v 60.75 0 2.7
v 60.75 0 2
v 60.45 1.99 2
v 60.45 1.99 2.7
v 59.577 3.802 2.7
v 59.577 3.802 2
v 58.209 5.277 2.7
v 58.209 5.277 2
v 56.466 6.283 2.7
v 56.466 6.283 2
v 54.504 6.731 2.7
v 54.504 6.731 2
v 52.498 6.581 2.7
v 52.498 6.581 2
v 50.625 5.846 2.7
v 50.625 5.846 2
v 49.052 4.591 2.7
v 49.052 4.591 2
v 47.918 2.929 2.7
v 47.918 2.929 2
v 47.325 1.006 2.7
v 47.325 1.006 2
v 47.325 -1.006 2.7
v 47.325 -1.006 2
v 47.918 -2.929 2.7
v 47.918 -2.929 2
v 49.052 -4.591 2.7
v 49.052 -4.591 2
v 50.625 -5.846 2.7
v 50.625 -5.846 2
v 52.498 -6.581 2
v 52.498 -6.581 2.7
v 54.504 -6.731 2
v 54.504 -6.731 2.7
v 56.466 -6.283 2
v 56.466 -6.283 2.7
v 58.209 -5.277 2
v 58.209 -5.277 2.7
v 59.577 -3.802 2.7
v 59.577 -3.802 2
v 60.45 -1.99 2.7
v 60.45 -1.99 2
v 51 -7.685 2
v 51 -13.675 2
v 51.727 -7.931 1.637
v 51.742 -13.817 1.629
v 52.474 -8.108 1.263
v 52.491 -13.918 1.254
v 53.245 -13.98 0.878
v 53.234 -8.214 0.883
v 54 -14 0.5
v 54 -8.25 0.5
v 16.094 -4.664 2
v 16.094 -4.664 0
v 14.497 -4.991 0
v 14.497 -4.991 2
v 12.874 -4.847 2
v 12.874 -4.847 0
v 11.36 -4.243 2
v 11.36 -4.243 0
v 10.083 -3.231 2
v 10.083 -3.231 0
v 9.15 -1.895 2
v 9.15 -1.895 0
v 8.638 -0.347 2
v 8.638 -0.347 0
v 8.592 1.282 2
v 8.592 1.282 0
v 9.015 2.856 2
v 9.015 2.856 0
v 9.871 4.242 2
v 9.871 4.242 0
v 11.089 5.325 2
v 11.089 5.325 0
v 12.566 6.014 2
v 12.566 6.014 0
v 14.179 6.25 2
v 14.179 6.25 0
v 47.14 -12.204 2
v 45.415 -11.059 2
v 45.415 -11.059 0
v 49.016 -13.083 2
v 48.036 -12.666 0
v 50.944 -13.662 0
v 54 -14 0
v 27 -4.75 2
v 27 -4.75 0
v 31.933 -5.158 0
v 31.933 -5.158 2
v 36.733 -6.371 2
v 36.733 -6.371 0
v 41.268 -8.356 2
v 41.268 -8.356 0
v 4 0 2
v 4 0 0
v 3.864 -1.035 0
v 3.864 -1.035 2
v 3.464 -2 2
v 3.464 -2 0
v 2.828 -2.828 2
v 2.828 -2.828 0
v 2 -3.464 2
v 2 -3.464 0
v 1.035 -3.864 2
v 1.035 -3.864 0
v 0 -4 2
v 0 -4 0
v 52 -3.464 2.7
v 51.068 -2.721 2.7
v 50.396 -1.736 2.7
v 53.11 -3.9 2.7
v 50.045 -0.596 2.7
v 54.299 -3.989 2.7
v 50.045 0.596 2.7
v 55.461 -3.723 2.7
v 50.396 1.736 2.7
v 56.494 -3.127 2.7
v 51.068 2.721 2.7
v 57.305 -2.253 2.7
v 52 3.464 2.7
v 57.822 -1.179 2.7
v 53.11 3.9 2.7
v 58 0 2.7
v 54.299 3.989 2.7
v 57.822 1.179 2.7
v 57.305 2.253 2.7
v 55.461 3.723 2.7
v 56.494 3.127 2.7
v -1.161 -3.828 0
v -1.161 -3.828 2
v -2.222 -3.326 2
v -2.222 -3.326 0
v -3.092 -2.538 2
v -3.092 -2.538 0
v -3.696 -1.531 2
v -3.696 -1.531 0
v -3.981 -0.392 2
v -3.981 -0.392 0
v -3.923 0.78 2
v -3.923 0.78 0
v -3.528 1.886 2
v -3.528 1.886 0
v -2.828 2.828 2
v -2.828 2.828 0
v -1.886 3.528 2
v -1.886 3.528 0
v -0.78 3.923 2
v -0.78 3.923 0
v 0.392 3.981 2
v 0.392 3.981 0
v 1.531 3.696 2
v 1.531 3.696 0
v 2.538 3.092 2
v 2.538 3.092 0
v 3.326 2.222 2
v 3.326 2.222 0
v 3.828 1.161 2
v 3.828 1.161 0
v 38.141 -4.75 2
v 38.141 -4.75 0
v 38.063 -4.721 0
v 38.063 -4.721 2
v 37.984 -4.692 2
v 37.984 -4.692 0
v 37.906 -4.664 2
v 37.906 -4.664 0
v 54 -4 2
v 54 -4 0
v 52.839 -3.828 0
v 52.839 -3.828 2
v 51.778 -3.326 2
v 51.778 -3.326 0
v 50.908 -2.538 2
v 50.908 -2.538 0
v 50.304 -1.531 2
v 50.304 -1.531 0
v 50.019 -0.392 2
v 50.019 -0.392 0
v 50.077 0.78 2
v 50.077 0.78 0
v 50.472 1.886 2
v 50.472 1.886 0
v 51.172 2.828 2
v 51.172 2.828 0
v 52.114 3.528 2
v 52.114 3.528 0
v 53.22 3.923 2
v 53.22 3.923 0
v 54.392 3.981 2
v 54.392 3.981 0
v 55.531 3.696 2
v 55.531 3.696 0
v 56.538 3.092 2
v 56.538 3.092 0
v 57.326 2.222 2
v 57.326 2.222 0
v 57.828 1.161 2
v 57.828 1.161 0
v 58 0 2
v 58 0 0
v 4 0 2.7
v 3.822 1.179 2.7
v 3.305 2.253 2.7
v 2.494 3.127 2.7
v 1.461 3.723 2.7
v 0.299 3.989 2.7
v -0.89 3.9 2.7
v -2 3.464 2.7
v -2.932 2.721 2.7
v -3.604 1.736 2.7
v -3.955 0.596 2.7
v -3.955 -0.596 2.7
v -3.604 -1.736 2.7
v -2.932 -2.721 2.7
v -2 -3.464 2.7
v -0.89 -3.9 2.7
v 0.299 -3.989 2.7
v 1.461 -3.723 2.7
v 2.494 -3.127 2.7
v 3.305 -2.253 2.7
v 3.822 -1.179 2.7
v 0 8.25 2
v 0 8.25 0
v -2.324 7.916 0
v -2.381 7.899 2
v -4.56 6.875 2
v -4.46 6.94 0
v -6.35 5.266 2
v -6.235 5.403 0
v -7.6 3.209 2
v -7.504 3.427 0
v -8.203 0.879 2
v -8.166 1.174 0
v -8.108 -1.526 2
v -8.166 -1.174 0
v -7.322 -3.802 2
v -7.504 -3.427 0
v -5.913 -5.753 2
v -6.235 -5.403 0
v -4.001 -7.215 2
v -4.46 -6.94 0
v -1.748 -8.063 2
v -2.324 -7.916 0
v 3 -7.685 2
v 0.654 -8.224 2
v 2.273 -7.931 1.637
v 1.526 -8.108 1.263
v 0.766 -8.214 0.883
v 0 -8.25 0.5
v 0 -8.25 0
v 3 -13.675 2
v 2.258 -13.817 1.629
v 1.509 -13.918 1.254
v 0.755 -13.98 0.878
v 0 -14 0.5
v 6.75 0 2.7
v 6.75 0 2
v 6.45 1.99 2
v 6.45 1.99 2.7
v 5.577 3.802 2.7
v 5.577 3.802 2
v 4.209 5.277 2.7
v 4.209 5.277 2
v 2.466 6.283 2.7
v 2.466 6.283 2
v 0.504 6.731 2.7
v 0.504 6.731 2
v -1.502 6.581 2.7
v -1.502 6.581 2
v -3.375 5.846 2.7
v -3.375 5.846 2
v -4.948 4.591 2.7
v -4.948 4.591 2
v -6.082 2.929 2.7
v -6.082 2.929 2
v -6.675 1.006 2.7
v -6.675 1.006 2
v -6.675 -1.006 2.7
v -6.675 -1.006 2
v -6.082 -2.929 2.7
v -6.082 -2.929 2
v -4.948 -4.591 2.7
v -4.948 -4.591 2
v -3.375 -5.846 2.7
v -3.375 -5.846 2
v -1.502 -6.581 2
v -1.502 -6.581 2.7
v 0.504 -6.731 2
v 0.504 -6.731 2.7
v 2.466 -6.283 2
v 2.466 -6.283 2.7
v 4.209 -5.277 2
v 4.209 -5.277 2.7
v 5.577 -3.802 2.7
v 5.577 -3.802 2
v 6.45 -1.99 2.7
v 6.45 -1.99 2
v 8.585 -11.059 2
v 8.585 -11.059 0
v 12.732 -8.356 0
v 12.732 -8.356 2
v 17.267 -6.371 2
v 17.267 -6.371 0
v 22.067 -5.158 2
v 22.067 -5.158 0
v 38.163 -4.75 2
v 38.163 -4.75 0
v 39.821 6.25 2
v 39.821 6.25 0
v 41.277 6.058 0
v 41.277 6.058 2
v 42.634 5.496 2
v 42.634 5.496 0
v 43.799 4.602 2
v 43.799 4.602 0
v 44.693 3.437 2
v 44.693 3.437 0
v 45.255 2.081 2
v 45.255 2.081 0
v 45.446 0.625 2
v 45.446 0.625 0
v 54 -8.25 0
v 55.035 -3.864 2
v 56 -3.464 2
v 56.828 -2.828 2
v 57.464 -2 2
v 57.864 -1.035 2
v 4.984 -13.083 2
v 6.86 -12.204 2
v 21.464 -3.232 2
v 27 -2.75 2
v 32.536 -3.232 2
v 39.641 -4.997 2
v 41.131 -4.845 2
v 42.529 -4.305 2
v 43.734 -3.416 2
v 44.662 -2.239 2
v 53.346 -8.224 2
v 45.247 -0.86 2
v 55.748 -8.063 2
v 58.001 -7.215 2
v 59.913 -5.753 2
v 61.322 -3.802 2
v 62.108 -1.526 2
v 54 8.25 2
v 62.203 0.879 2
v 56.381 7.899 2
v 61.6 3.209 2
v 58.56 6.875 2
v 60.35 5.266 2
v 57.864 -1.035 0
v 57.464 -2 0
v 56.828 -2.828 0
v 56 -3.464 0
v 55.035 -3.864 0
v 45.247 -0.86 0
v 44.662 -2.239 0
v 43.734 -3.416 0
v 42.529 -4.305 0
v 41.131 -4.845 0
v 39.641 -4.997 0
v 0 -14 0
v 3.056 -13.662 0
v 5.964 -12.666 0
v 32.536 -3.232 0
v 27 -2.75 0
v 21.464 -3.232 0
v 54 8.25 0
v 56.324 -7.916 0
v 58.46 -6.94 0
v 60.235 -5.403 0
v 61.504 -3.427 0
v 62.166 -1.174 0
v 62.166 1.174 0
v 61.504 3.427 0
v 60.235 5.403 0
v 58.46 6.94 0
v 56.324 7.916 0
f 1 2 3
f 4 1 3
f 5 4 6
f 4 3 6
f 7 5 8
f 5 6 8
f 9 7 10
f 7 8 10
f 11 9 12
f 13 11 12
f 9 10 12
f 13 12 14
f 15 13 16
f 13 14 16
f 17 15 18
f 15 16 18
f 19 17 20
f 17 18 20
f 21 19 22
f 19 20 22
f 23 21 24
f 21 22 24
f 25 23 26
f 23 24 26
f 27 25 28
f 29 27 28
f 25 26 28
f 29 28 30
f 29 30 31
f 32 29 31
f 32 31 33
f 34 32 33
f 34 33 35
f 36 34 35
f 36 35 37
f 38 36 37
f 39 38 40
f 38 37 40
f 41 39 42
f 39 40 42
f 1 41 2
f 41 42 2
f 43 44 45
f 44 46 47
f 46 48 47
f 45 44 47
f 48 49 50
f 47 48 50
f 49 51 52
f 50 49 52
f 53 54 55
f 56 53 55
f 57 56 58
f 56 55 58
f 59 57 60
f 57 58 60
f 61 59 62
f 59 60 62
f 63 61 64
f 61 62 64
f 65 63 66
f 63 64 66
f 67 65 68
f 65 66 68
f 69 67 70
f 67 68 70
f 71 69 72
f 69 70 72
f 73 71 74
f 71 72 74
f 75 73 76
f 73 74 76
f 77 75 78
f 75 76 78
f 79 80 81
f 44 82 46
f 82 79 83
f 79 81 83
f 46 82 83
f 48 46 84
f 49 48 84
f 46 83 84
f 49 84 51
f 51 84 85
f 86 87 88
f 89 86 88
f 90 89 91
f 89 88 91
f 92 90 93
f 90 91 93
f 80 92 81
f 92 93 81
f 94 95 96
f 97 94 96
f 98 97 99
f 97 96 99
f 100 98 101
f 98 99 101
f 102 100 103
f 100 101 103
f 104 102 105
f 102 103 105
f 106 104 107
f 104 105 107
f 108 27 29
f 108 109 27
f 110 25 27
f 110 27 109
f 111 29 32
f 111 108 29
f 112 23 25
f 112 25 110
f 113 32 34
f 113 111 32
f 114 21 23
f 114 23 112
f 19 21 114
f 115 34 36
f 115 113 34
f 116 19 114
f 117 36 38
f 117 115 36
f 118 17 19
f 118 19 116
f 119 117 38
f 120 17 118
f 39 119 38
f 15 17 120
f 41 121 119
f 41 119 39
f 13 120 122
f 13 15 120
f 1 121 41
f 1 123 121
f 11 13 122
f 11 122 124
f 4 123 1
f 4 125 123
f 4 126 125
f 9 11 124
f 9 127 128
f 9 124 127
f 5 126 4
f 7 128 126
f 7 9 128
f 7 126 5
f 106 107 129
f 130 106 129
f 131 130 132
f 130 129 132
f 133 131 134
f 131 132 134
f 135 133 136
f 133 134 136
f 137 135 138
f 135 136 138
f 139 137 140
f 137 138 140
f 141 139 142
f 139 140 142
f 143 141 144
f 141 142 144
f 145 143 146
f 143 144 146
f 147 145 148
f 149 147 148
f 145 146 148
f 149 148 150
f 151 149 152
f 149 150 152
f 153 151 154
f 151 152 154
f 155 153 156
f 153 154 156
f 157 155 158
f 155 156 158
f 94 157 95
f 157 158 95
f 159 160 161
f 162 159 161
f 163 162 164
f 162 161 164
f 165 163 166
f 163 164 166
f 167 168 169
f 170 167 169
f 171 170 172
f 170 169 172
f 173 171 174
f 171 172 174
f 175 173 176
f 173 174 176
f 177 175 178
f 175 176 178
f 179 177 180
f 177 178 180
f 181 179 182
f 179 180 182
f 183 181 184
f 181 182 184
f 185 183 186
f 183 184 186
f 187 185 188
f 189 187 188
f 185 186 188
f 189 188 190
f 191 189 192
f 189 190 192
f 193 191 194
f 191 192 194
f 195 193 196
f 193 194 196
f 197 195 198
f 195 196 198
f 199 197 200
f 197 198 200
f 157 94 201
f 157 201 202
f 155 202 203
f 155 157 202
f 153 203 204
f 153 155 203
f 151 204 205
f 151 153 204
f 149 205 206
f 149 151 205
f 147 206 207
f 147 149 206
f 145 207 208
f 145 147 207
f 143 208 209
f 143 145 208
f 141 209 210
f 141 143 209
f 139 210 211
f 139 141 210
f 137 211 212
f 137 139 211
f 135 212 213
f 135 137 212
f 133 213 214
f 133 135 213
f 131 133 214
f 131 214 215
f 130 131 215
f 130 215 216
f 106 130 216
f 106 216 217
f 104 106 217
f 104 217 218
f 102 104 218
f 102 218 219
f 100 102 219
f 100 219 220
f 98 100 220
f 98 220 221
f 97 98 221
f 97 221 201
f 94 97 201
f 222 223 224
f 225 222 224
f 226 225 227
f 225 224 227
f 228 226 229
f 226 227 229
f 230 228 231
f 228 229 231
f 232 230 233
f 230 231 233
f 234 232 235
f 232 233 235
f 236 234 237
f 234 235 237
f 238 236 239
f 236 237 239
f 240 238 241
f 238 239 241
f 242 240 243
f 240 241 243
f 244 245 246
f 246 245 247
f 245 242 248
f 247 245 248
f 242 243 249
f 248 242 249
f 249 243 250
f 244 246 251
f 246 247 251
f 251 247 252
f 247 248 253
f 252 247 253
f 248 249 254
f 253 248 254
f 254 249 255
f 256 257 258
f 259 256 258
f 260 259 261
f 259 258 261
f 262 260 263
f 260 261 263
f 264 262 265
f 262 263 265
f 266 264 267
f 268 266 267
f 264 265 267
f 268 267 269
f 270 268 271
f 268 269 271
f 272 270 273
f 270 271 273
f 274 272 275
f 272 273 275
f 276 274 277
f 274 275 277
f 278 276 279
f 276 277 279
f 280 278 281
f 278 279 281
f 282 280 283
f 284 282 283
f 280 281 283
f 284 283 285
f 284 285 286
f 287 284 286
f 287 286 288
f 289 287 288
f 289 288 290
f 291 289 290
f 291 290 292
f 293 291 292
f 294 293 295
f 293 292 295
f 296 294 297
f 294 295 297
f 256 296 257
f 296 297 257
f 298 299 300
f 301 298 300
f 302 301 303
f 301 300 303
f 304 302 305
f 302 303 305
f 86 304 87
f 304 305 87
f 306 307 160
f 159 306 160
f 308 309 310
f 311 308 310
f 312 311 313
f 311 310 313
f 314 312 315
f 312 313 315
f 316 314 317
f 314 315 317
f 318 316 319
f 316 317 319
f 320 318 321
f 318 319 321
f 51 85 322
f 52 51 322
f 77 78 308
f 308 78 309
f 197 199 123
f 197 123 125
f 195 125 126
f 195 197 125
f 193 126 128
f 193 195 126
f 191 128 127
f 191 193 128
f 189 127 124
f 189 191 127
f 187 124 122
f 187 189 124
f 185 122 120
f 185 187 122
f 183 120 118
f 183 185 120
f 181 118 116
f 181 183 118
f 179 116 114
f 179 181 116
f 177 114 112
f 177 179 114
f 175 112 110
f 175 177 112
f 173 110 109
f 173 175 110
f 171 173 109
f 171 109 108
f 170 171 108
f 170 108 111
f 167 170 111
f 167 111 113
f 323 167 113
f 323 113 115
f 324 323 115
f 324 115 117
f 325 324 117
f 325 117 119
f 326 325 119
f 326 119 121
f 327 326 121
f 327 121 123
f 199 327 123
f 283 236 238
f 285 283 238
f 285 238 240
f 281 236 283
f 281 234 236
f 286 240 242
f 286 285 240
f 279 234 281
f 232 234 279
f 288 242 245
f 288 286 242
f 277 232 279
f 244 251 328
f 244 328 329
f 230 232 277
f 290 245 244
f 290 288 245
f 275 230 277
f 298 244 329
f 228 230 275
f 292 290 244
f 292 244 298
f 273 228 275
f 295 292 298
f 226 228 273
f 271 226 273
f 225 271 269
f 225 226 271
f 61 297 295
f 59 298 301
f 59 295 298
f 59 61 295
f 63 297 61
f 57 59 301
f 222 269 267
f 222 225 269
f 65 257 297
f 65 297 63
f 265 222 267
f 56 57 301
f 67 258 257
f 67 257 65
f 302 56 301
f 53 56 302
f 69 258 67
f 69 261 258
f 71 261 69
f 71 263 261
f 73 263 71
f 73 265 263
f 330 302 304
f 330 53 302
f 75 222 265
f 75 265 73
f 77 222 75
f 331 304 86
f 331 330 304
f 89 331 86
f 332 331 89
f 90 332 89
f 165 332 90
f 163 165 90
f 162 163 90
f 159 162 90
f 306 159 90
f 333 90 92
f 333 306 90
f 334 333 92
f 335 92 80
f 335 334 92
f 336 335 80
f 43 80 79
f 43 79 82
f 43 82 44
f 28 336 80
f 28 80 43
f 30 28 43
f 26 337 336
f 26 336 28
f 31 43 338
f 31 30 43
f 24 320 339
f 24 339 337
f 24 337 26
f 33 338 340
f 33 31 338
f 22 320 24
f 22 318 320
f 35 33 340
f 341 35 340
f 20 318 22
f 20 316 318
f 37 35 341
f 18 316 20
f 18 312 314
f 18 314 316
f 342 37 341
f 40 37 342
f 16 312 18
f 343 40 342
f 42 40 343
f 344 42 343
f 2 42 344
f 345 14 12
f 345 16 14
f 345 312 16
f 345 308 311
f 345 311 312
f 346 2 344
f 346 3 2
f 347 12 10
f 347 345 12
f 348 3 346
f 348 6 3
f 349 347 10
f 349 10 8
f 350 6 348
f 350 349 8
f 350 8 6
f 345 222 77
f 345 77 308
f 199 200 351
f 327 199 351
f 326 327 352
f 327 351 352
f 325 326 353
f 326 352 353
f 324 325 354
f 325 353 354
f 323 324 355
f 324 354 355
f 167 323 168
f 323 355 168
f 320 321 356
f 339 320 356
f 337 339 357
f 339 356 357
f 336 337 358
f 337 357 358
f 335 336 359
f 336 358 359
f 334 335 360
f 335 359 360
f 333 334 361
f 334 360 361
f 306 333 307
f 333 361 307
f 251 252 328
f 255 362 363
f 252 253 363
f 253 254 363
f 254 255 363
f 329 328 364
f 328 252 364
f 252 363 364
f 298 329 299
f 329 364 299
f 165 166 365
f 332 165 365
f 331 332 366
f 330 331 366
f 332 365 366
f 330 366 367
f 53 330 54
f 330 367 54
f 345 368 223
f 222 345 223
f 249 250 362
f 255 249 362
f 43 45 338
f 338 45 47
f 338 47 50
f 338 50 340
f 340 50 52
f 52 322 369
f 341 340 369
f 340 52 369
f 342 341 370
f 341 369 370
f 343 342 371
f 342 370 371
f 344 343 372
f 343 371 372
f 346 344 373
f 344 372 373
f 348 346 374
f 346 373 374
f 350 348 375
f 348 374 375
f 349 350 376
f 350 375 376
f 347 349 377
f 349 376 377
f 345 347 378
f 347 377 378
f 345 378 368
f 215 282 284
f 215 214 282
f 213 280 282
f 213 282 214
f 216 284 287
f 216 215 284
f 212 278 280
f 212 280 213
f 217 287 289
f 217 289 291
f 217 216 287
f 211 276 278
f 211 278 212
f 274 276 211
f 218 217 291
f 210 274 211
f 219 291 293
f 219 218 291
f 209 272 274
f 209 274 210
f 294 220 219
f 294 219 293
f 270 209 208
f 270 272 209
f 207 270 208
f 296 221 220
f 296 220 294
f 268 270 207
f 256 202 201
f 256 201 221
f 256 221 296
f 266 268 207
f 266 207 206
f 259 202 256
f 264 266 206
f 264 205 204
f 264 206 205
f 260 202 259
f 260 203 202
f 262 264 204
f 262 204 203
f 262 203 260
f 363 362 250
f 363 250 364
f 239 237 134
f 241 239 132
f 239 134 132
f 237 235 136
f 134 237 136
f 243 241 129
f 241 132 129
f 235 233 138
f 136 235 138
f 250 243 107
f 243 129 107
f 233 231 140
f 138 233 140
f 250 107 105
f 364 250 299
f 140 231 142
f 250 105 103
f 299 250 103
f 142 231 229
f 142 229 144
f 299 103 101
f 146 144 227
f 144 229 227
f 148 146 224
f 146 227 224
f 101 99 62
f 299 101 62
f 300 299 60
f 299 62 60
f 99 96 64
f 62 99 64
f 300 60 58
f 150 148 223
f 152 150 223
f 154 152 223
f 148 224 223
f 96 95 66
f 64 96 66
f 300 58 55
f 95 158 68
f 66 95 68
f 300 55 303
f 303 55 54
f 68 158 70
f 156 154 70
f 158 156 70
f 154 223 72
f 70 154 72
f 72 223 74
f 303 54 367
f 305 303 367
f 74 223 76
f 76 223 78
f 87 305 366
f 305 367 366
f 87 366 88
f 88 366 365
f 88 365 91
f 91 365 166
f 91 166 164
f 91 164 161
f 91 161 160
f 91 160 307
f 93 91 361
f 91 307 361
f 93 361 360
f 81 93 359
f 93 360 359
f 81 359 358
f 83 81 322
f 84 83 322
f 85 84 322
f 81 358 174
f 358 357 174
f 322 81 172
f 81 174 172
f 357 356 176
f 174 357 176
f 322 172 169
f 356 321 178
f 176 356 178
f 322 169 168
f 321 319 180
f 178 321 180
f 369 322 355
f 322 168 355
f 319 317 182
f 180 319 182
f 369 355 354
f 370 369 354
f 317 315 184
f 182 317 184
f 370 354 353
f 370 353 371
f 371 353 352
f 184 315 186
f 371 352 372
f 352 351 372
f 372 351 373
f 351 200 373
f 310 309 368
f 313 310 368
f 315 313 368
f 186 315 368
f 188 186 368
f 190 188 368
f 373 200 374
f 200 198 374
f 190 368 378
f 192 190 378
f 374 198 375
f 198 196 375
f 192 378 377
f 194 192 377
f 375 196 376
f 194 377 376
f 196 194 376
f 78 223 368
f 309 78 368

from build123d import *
from build123d import SkipClean  # not in build123d's __all__

# Parameters (mm, degrees)
F1_DEPTH = 2
F2_R     = 6.75
F2_R_2   = 4
F3_DEPTH = 0.7
F4_SIZE2 = 1.5
F4_SIZE  = 3


with BuildPart() as f1:
    # F0 (on Top) → F1 (new body)
    with BuildSketch(Plane.XY):
        with BuildLine():
            ThreePointArc((0, 8.25), (-8.25, 0), (0, -8.25))
            Line((0, -8.25), (0, -14))
            ThreePointArc((0, -14), (4.5374051759, -13.2443178107), (8.5849765979, -11.05885061))
            ThreePointArc((8.5849765979, -11.05885061), (17.2671345057, -6.3709601788), (27, -4.75))
            ThreePointArc((27, -4.75), (36.7328654943, -6.3709601788), (45.4150234021, -11.05885061))
            ThreePointArc((45.4150234021, -11.05885061), (49.4625948241, -13.2443178107), (54, -14))
            Line((54, -14), (54, -8.25))
            ThreePointArc((54, -8.25), (62.25, 0), (54, 8.25))
            Line((54, 8.25), (0, 8.25))
        make_face()
        with BuildLine():
            ThreePointArc((0, -4), (-2.8284271247, 2.8284271247), (4, 0))
            ThreePointArc((4, 0), (2.8284271247, -2.8284271247), (0, -4))
        make_face(mode=Mode.SUBTRACT)
        with BuildLine():
            Line((38.1630301369, -4.75), (38.1409883593, -4.75))
            ThreePointArc((38.1409883593, -4.75), (38.0236172708, -4.7067170267), (37.9060780323, -4.6638927855))
            ThreePointArc((37.9060780323, -4.6638927855), (27.0000000348, -2.75), (16.0939220331, -4.6638927618))
            ThreePointArc((16.0939220331, -4.6638927618), (8.6383214319, -0.3472662226), (14.1786574679, 6.25))
            Line((14.1786574679, 6.25), (39.8213425321, 6.25))
            ThreePointArc((39.8213425321, 6.25), (43.7988181762, 4.6024756442), (45.4463425321, 0.625))
            ThreePointArc((45.4463425321, 0.625), (43.1614486514, -3.9009602419), (38.1630301369, -4.75))
        make_face(mode=Mode.SUBTRACT)
        with BuildLine():
            ThreePointArc((58, 0), (56.8284271247, -2.8284271247), (54, -4))
            ThreePointArc((54, -4), (51.1715728753, 2.8284271247), (58, 0))
        make_face(mode=Mode.SUBTRACT)
    extrude(amount=F1_DEPTH)

    # F2 (on face) → F3 (join)
    with BuildSketch(Plane.XY.offset(2)):
        Circle(F2_R)
        Circle(F2_R_2, mode=Mode.SUBTRACT)
        with Locations((54, 0)):
            Circle(F2_R)
        with Locations((54, 0)):
            Circle(F2_R_2, mode=Mode.SUBTRACT)
    with SkipClean():  # cleaning this boolean's faces spoils the solid; the shape is the same uncleaned
        extrude(amount=F3_DEPTH)

    # F4
    f4_edges = [f1.edges().sort_by_distance(p)[0] for p in [
        (0, -11.125, 2),
        (54, -11.125, 2),
    ]]
    f4_side = f1.faces().sort_by_distance((49.702195, -12.544944, 2))[0]
    chamfer(f4_edges, length=F4_SIZE, length2=F4_SIZE2, reference=f4_side)


solid = f1.part
